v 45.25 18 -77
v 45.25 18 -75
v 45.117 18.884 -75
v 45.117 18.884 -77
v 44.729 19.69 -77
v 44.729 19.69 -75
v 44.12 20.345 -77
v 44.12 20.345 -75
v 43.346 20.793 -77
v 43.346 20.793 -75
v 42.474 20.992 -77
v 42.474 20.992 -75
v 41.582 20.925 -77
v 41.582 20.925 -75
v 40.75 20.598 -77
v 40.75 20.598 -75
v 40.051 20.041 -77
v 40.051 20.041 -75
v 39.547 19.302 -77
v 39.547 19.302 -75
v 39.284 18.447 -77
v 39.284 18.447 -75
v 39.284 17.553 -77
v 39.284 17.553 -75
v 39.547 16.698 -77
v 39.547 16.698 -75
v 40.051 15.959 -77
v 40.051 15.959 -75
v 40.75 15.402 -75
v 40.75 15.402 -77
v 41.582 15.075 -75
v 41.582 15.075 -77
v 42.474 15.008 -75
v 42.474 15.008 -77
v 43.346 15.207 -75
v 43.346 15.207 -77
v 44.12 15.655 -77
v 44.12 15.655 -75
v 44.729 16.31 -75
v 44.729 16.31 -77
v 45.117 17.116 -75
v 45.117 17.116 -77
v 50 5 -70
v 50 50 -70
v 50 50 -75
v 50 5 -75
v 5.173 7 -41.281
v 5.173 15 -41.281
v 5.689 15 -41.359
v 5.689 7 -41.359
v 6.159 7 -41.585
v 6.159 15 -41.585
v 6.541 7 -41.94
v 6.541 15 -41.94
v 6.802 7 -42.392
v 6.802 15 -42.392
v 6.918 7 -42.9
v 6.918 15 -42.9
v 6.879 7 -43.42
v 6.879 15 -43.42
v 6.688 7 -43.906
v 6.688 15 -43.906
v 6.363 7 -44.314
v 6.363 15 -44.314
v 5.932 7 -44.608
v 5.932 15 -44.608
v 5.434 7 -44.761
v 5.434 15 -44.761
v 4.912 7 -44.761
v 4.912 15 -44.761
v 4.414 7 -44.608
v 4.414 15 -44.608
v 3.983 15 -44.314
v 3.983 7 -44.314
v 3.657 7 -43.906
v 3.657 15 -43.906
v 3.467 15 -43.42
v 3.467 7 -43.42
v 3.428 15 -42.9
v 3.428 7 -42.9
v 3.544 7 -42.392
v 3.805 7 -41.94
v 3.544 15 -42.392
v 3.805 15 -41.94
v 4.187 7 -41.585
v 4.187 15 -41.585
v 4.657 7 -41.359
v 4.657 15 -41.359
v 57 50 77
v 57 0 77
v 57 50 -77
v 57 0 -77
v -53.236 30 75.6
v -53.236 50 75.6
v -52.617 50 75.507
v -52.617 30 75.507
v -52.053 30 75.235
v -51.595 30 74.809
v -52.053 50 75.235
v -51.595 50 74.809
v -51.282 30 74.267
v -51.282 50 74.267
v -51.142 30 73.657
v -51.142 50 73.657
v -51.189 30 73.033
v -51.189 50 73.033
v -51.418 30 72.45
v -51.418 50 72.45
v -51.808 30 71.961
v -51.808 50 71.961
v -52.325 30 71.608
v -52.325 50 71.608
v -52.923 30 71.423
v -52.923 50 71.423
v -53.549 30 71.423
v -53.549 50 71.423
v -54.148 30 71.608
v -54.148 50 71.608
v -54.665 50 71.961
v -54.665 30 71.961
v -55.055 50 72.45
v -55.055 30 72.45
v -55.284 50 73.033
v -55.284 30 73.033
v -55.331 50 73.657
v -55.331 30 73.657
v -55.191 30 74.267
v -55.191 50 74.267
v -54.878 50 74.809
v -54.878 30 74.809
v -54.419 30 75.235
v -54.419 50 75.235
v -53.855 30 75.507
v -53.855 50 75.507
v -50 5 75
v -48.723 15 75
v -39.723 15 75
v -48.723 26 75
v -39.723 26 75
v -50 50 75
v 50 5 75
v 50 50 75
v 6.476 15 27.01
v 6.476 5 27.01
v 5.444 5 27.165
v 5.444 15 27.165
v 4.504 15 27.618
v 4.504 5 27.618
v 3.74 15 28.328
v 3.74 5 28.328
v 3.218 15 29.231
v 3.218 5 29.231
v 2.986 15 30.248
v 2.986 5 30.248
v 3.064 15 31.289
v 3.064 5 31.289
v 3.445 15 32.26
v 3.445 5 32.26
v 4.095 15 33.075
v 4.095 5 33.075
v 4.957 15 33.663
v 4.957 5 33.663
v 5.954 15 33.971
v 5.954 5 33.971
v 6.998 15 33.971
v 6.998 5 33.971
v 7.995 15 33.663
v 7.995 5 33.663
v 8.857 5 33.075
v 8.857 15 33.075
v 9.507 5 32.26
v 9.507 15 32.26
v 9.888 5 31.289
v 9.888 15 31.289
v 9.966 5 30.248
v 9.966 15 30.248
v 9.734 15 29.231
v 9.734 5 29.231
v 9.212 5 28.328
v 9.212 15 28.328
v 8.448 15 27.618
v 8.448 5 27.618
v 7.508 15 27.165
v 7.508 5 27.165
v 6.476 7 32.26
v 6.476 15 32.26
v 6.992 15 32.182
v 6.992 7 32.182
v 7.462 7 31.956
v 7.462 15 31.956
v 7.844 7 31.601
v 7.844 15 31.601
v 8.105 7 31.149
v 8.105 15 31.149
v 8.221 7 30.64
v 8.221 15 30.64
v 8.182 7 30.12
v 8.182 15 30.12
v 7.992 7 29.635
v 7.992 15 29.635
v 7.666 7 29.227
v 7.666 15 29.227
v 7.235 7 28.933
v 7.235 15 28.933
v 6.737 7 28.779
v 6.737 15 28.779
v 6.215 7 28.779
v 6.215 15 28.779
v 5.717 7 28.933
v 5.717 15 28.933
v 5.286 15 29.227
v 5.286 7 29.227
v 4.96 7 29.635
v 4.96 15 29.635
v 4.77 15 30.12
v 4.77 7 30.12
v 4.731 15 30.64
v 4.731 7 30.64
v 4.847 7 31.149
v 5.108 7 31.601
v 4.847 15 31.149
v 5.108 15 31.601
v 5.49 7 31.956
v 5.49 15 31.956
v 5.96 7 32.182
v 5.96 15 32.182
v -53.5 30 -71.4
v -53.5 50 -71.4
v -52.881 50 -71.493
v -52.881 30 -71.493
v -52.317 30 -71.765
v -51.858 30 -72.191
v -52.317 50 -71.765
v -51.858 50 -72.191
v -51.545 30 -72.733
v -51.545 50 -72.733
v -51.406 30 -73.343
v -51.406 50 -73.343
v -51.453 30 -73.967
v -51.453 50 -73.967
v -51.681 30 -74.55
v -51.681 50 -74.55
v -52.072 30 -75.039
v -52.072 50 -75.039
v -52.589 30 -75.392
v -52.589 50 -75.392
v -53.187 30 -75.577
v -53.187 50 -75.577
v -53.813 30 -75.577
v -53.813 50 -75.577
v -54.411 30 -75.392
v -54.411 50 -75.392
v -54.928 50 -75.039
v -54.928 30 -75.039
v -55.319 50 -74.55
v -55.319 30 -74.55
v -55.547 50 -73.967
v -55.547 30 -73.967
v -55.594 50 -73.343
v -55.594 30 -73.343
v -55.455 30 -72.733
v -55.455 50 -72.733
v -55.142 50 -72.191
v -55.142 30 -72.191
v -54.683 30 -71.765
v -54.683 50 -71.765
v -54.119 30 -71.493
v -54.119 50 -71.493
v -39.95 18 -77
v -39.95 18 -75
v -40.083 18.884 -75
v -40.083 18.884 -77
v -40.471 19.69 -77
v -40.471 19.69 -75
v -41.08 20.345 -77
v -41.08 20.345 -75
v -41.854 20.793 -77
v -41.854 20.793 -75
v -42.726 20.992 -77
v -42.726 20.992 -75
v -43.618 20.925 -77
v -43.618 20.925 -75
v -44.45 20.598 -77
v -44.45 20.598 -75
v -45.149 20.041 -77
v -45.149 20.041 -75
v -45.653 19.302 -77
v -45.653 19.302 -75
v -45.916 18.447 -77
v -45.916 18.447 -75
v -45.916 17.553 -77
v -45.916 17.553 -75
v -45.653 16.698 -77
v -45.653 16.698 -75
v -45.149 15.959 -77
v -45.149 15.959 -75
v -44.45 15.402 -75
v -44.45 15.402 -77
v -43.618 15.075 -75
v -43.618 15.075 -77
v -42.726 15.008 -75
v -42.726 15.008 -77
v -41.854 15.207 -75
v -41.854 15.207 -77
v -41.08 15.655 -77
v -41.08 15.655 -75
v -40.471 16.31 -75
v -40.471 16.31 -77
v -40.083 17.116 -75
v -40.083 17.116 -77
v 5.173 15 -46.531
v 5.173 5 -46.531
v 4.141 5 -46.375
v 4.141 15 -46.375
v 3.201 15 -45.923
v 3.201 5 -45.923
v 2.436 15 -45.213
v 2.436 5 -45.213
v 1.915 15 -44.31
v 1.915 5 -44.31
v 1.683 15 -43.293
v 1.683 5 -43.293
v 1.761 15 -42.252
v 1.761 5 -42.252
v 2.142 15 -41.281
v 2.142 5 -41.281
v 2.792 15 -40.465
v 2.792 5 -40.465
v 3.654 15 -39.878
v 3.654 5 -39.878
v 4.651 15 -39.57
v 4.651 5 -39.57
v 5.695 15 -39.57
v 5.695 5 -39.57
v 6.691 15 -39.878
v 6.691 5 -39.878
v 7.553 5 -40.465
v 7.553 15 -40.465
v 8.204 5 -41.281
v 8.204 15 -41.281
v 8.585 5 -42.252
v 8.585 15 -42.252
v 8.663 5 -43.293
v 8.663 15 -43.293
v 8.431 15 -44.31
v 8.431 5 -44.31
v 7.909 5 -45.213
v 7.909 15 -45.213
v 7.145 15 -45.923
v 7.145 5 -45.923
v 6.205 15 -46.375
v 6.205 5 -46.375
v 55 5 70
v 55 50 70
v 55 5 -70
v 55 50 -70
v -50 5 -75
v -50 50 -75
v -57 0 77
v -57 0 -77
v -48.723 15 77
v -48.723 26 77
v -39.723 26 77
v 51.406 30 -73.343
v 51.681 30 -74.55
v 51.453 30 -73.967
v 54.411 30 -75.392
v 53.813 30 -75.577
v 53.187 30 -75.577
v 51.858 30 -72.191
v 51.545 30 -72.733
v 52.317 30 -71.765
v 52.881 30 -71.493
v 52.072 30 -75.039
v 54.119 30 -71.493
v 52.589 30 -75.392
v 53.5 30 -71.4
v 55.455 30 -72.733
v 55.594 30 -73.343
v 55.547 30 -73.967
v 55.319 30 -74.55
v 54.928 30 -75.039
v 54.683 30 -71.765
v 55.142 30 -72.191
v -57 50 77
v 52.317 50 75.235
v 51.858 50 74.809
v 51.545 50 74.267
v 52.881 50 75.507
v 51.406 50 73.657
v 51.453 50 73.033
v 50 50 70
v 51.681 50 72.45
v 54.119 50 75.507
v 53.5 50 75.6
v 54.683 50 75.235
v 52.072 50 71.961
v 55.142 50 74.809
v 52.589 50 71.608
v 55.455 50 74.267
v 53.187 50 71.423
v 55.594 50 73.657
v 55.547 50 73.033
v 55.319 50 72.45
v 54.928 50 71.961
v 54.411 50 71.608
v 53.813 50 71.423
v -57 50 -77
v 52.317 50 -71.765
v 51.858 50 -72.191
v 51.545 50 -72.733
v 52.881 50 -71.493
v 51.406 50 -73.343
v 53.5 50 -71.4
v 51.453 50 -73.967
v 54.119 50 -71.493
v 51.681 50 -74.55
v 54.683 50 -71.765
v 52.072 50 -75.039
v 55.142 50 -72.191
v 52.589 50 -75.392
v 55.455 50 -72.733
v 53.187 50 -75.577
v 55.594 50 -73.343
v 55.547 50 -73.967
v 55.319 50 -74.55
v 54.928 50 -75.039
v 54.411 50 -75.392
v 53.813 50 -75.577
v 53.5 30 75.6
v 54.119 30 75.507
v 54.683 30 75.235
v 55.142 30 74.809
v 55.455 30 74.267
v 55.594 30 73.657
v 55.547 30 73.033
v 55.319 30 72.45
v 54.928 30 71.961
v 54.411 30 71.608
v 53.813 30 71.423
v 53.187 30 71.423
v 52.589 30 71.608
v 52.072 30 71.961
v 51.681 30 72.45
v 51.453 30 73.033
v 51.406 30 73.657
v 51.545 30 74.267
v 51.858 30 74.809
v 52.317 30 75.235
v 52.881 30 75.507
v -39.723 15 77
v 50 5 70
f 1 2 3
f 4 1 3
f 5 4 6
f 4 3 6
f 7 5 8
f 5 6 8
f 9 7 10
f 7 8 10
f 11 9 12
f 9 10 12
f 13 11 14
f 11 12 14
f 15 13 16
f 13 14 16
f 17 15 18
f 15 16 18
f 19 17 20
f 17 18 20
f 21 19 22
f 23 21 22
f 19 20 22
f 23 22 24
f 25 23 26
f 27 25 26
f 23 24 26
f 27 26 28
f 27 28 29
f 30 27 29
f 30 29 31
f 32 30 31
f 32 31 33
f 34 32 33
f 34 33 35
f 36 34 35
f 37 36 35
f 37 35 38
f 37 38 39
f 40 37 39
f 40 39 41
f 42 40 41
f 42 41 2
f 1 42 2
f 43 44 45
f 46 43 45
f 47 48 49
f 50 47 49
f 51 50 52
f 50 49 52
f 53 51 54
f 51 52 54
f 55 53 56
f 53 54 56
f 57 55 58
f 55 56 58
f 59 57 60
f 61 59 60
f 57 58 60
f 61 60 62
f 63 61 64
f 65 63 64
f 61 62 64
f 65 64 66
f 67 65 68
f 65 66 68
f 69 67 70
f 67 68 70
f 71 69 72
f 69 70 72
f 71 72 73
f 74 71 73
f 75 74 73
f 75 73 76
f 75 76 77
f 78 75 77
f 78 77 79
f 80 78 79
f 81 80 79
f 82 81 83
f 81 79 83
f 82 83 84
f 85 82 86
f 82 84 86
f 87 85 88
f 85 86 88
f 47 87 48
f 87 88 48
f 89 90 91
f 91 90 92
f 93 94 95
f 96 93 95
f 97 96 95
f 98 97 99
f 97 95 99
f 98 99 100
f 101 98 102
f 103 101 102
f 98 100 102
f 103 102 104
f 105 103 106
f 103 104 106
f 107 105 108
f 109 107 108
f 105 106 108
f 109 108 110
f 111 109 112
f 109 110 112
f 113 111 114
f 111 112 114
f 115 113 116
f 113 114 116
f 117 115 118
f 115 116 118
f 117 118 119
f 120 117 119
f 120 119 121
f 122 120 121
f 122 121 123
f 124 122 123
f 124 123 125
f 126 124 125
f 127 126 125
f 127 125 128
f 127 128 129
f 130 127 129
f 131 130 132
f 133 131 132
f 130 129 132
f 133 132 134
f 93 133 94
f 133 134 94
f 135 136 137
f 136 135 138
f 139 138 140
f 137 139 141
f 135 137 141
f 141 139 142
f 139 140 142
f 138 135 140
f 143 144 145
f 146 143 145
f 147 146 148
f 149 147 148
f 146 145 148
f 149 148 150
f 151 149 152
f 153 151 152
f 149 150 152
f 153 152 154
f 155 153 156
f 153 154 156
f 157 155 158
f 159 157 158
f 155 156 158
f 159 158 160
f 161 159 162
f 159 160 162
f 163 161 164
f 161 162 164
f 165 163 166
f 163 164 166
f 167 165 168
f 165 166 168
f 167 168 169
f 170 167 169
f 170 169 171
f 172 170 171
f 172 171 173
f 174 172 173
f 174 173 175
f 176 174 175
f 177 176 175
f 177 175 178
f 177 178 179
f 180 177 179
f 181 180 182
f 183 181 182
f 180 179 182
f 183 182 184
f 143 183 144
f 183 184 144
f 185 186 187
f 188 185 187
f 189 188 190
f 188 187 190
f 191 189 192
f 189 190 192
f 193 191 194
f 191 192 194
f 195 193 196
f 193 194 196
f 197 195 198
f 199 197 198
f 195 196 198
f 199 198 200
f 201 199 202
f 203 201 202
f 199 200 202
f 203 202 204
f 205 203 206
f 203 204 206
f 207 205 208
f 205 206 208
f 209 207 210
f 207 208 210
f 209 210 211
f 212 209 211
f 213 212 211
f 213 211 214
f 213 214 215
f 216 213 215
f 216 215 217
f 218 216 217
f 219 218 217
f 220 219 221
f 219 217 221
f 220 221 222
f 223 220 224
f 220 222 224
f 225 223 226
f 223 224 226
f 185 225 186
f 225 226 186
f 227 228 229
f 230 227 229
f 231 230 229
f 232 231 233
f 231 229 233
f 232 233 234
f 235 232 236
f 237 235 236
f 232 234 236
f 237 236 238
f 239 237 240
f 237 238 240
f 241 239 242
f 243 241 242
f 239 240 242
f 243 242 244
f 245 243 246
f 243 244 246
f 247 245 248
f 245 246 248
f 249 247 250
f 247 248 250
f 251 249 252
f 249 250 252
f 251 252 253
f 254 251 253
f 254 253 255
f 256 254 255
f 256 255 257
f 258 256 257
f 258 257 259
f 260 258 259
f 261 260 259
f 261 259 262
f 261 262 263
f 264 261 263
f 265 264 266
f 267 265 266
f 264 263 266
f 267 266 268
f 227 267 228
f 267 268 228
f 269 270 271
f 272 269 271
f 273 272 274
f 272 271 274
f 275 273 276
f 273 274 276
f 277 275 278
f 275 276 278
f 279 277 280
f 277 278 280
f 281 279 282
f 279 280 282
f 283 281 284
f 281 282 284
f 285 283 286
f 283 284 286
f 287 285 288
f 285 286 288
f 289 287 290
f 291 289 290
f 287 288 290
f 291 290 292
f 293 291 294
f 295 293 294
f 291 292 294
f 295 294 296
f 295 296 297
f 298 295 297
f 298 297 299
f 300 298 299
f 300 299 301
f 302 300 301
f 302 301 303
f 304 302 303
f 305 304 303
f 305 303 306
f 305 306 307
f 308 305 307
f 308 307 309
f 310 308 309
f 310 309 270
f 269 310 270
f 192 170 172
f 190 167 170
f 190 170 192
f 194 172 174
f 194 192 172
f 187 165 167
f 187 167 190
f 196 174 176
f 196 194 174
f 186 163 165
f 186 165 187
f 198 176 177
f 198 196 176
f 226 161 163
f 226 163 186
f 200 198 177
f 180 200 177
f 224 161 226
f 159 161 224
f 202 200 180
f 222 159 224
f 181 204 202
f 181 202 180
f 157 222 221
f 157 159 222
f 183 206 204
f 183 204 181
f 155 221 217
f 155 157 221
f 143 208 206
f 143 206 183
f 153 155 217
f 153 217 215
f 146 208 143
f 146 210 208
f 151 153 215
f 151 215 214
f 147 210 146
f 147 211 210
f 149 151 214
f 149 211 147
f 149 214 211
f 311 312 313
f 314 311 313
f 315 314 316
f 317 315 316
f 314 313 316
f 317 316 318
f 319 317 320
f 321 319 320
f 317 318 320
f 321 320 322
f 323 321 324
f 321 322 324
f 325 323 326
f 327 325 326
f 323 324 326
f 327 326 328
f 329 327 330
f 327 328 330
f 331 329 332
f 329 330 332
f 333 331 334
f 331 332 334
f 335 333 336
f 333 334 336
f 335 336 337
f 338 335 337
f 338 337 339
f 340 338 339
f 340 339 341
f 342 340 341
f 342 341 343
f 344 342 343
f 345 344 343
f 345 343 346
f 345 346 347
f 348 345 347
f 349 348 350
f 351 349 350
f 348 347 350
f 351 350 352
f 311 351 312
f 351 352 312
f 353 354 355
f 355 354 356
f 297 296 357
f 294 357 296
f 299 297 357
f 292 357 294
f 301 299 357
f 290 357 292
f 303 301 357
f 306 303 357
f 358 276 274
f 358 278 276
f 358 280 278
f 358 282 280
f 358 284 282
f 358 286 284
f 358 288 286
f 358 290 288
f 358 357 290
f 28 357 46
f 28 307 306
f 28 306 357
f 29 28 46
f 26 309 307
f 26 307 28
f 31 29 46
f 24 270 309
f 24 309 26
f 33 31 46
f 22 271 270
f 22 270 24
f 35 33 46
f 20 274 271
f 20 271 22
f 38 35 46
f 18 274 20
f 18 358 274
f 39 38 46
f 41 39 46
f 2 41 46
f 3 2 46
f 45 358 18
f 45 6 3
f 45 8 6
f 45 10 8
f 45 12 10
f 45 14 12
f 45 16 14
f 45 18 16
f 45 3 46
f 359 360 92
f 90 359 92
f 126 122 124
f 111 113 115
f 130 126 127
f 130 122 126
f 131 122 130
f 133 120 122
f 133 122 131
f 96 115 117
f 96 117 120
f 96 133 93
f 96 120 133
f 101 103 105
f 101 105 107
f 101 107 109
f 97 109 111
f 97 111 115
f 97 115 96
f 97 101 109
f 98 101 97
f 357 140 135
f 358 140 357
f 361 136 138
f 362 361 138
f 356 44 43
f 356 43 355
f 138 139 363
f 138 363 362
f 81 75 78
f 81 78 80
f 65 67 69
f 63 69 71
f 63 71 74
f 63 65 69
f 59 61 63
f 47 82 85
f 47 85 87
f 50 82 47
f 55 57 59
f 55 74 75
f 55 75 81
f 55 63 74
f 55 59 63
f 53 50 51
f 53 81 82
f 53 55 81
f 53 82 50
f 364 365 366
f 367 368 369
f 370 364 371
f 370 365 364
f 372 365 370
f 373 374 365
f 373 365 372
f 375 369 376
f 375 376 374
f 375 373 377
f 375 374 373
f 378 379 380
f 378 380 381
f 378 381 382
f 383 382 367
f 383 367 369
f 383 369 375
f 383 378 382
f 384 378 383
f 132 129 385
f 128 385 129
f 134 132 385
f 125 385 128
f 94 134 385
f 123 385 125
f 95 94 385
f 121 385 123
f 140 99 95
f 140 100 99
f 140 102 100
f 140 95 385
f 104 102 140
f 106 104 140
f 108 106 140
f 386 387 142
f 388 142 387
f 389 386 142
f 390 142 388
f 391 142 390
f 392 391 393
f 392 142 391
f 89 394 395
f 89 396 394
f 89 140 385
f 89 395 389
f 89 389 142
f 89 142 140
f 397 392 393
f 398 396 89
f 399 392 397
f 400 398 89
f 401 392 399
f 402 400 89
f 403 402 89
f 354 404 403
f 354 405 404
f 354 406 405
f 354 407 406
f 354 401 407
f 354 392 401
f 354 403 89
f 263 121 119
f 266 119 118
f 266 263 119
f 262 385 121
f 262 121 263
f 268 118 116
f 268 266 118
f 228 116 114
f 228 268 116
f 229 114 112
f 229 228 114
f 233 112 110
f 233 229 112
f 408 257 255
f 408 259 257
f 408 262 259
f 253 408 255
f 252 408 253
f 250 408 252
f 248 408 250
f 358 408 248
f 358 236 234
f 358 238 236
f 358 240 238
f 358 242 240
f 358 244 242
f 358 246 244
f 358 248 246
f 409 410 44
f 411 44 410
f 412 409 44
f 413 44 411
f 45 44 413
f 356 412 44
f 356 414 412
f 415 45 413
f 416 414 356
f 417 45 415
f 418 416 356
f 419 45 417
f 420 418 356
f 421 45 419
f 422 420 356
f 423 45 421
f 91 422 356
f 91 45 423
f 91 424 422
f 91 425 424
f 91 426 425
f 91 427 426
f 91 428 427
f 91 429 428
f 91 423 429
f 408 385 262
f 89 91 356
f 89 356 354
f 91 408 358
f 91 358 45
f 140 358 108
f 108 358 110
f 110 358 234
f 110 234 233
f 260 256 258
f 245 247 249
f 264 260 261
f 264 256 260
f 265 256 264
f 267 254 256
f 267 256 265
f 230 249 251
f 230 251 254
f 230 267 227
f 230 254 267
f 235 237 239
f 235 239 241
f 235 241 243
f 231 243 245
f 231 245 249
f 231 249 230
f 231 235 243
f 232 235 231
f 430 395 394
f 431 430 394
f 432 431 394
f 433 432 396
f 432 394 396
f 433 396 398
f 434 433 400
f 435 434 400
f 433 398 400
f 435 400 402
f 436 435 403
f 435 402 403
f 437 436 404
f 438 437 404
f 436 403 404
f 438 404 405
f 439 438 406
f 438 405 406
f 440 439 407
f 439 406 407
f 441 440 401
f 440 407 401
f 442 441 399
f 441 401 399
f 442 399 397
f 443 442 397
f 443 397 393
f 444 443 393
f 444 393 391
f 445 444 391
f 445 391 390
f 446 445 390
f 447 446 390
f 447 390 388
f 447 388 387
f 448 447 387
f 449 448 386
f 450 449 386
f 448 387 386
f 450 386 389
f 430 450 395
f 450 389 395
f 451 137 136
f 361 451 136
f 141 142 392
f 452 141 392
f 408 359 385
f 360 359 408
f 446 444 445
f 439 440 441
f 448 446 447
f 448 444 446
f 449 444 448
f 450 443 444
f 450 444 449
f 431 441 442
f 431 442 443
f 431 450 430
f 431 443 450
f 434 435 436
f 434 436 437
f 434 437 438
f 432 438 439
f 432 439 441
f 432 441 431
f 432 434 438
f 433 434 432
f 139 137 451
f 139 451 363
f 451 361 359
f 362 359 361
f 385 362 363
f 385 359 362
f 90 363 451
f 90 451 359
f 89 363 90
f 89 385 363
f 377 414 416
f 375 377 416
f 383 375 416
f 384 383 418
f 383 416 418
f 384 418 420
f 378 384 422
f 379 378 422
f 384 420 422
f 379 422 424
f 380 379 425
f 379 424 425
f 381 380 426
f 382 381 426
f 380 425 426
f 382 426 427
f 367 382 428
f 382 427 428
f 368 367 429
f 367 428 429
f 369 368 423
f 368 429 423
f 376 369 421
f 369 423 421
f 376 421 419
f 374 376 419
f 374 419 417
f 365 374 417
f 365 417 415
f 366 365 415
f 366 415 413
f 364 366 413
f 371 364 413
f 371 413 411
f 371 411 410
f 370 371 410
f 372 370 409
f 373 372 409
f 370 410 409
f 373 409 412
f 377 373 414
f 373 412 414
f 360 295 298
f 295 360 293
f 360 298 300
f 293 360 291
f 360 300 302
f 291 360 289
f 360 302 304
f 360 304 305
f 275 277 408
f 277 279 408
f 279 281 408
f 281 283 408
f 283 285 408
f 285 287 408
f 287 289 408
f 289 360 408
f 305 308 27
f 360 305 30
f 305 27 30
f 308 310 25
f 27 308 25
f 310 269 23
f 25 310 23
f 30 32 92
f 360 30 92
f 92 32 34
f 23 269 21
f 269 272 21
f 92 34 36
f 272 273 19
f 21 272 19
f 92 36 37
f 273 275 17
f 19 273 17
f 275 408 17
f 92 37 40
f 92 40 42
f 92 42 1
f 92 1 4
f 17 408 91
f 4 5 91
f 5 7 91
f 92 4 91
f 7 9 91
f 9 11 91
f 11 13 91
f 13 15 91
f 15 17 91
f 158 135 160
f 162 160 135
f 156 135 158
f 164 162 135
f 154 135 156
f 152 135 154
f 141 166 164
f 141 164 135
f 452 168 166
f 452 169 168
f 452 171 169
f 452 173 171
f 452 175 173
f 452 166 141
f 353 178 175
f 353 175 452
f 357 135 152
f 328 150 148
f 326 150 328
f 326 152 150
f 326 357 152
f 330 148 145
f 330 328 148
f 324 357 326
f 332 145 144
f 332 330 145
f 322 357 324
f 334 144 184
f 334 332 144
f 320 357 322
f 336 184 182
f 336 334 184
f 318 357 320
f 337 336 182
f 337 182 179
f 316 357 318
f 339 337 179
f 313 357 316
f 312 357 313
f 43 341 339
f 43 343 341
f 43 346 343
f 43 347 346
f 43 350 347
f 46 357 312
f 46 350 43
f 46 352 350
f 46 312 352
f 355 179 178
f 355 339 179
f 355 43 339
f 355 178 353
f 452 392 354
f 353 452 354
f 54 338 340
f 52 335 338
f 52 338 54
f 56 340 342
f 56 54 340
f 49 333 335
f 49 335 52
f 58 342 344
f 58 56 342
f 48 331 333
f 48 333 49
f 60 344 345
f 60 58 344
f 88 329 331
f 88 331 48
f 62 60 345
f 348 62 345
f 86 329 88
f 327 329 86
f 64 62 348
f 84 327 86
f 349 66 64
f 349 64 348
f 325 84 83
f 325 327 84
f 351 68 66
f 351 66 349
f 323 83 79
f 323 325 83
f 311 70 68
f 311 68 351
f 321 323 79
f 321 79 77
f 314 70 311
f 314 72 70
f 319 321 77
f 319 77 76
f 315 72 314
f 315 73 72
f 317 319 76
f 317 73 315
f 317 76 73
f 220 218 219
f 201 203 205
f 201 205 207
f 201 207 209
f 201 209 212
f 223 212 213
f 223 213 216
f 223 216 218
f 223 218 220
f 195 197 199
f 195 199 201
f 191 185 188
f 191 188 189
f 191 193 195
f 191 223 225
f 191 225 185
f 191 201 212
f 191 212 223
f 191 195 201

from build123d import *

# Parameters (mm, degrees)
SKETCH3_W           = 114
SKETCH3_H           = 164
BOSS_EXTRUDE2_DEPTH = 50
SKETCH4_W           = 100
SKETCH4_H           = 150
CUT_EXTRUDE2_DEPTH  = 45
SKETCH9_W           = 114
SKETCH9_H           = 5
CUT_EXTRUDE5_DEPTH  = 112.68258593
SKETCH10_W          = 114
SKETCH10_H          = 5
CUT_EXTRUDE6_DEPTH  = 112.68258593
SKETCH12_R          = 2.1
CUT_EXTRUDE8_DEPTH  = 20
SKETCH13_R          = 2.1
CUT_EXTRUDE9_DEPTH  = 20
SKETCH14_R          = 2.1
CUT_EXTRUDE10_DEPTH = 20
SKETCH15_W          = 5
SKETCH15_H          = 140
CUT_EXTRUDE11_DEPTH = 45
SKETCH16_R          = 3.5
BOSS_EXTRUDE3_DEPTH = 10
SKETCH17_R          = 1.75
CUT_EXTRUDE12_DEPTH = 8
SKETCH18_R          = 1.75
CUT_EXTRUDE13_DEPTH = 8
SKETCH19_W          = 9
SKETCH19_H          = 11
CUT_EXTRUDE14_DEPTH = 170.861708457
SKETCH21_R          = 3
CUT_EXTRUDE16_DEPTH = 170.861708457
SKETCH22_R          = 3
CUT_EXTRUDE17_DEPTH = 170.861708457


with BuildPart() as part:
    # Sketch3 → Boss-Extrude2 (new body)
    with BuildSketch(Plane(origin=(0, 0, 0), x_dir=(1, 0, 0), z_dir=(0, 1, 0))):
        Rectangle(SKETCH3_W, SKETCH3_H)
    extrude(amount=BOSS_EXTRUDE2_DEPTH)

    # Sketch4 → Cut-Extrude2 (cut)
    with BuildSketch(Plane(origin=(0, 50, 0), x_dir=(1, 0, 0), z_dir=(0, 1, 0))):
        Rectangle(SKETCH4_W, SKETCH4_H)
    extrude(amount=-CUT_EXTRUDE2_DEPTH, mode=Mode.SUBTRACT)

    # Sketch9 → Cut-Extrude5 (cut, through all)
    with BuildSketch(Plane(origin=(0, 50, 0), x_dir=(1, 0, 0), z_dir=(0, 1, 0))):
        with Locations((0, -79.5)):
            Rectangle(SKETCH9_W, SKETCH9_H)
    extrude(amount=-CUT_EXTRUDE5_DEPTH, mode=Mode.SUBTRACT)

    # Sketch10 → Cut-Extrude6 (cut, through all)
    with BuildSketch(Plane(origin=(0, 50, 0), x_dir=(1, 0, 0), z_dir=(0, 1, 0))):
        with Locations((0, 79.5)):
            Rectangle(SKETCH10_W, SKETCH10_H)
    extrude(amount=-CUT_EXTRUDE6_DEPTH, mode=Mode.SUBTRACT)

    # Sketch12 → Cut-Extrude8 (cut)
    with BuildSketch(Plane(origin=(0, 50, 0), x_dir=(1, 0, 0), z_dir=(0, 1, 0))):
        with Locations(Location((-53.236459808, -73.5, 0), (0, 0, 270))):
            Circle(SKETCH12_R)
    extrude(amount=-CUT_EXTRUDE8_DEPTH, mode=Mode.SUBTRACT)

    # Sketch13 → Cut-Extrude9 (cut)
    with BuildSketch(Plane(origin=(0, 50, 0), x_dir=(1, 0, 0), z_dir=(0, 1, 0))):
        with Locations(Location((53.5, -73.5, 0), (0, 0, 270))):
            Circle(SKETCH13_R)
    extrude(amount=-CUT_EXTRUDE9_DEPTH, mode=Mode.SUBTRACT)

    # Sketch14 → Cut-Extrude10 (cut)
    with BuildSketch(Plane(origin=(0, 50, 0), x_dir=(1, 0, 0), z_dir=(0, 1, 0))):
        with Locations(Location((53.5, 73.5, 0), (0, 0, 270))):
            Circle(SKETCH14_R)
        with Locations(Location((-53.5, 73.5, 0), (0, 0, 270))):
            Circle(SKETCH14_R)
    extrude(amount=-CUT_EXTRUDE10_DEPTH, mode=Mode.SUBTRACT)

    # Sketch15 → Cut-Extrude11 (cut)
    with BuildSketch(Plane(origin=(0, 50, 0), x_dir=(1, 0, 0), z_dir=(0, 1, 0))):
        with Locations((52.5, 0)):
            Rectangle(SKETCH15_W, SKETCH15_H)
    extrude(amount=-CUT_EXTRUDE11_DEPTH, mode=Mode.SUBTRACT)

    # Sketch16 → Boss-Extrude3 (add)
    with BuildSketch(Plane(origin=(0, 5, 0), x_dir=(1, 0, 0), z_dir=(0, 1, 0))):
        with Locations(Location((5.172888084, 43.030985647, 0), (0, 0, 90))):
            Circle(SKETCH16_R)
        with Locations(Location((6.475980518, -30.509718968, 0), (0, 0, 90))):
            Circle(SKETCH16_R)
    extrude(amount=BOSS_EXTRUDE3_DEPTH)

    # Sketch17 → Cut-Extrude12 (cut)
    with BuildSketch(Plane(origin=(0, 15, 0), x_dir=(1, 0, 0), z_dir=(0, 1, 0))):
        with Locations(Location((5.172888084, 43.030985647, 0), (0, 0, 270))):
            Circle(SKETCH17_R)
    extrude(amount=-CUT_EXTRUDE12_DEPTH, mode=Mode.SUBTRACT)

    # Sketch18 → Cut-Extrude13 (cut)
    with BuildSketch(Plane(origin=(0, 15, 0), x_dir=(1, 0, 0), z_dir=(0, 1, 0))):
        with Locations(Location((6.475980518, -30.509718968, 0), (0, 0, 270))):
            Circle(SKETCH18_R)
    extrude(amount=-CUT_EXTRUDE13_DEPTH, mode=Mode.SUBTRACT)

    # Sketch19 → Cut-Extrude14 (cut, through all)
    with BuildSketch(Plane(origin=(0, 0, 75), x_dir=(-1, 0, 0), z_dir=(0, 0, -1))):
        with Locations((44.222656572, 20.5)):
            Rectangle(SKETCH19_W, SKETCH19_H)
    extrude(amount=-CUT_EXTRUDE14_DEPTH, mode=Mode.SUBTRACT)

    # Sketch21 → Cut-Extrude16 (cut, through all)
    with BuildSketch(Plane.XY.offset(-75)):
        with Locations((42.25, 18)):
            Circle(SKETCH21_R)
    extrude(amount=-CUT_EXTRUDE16_DEPTH, mode=Mode.SUBTRACT)

    # Sketch22 → Cut-Extrude17 (cut, through all)
    with BuildSketch(Plane.XY.offset(-75)):
        with Locations((-42.95, 18)):
            Circle(SKETCH22_R)
    extrude(amount=-CUT_EXTRUDE17_DEPTH, mode=Mode.SUBTRACT)


solid = part.part
